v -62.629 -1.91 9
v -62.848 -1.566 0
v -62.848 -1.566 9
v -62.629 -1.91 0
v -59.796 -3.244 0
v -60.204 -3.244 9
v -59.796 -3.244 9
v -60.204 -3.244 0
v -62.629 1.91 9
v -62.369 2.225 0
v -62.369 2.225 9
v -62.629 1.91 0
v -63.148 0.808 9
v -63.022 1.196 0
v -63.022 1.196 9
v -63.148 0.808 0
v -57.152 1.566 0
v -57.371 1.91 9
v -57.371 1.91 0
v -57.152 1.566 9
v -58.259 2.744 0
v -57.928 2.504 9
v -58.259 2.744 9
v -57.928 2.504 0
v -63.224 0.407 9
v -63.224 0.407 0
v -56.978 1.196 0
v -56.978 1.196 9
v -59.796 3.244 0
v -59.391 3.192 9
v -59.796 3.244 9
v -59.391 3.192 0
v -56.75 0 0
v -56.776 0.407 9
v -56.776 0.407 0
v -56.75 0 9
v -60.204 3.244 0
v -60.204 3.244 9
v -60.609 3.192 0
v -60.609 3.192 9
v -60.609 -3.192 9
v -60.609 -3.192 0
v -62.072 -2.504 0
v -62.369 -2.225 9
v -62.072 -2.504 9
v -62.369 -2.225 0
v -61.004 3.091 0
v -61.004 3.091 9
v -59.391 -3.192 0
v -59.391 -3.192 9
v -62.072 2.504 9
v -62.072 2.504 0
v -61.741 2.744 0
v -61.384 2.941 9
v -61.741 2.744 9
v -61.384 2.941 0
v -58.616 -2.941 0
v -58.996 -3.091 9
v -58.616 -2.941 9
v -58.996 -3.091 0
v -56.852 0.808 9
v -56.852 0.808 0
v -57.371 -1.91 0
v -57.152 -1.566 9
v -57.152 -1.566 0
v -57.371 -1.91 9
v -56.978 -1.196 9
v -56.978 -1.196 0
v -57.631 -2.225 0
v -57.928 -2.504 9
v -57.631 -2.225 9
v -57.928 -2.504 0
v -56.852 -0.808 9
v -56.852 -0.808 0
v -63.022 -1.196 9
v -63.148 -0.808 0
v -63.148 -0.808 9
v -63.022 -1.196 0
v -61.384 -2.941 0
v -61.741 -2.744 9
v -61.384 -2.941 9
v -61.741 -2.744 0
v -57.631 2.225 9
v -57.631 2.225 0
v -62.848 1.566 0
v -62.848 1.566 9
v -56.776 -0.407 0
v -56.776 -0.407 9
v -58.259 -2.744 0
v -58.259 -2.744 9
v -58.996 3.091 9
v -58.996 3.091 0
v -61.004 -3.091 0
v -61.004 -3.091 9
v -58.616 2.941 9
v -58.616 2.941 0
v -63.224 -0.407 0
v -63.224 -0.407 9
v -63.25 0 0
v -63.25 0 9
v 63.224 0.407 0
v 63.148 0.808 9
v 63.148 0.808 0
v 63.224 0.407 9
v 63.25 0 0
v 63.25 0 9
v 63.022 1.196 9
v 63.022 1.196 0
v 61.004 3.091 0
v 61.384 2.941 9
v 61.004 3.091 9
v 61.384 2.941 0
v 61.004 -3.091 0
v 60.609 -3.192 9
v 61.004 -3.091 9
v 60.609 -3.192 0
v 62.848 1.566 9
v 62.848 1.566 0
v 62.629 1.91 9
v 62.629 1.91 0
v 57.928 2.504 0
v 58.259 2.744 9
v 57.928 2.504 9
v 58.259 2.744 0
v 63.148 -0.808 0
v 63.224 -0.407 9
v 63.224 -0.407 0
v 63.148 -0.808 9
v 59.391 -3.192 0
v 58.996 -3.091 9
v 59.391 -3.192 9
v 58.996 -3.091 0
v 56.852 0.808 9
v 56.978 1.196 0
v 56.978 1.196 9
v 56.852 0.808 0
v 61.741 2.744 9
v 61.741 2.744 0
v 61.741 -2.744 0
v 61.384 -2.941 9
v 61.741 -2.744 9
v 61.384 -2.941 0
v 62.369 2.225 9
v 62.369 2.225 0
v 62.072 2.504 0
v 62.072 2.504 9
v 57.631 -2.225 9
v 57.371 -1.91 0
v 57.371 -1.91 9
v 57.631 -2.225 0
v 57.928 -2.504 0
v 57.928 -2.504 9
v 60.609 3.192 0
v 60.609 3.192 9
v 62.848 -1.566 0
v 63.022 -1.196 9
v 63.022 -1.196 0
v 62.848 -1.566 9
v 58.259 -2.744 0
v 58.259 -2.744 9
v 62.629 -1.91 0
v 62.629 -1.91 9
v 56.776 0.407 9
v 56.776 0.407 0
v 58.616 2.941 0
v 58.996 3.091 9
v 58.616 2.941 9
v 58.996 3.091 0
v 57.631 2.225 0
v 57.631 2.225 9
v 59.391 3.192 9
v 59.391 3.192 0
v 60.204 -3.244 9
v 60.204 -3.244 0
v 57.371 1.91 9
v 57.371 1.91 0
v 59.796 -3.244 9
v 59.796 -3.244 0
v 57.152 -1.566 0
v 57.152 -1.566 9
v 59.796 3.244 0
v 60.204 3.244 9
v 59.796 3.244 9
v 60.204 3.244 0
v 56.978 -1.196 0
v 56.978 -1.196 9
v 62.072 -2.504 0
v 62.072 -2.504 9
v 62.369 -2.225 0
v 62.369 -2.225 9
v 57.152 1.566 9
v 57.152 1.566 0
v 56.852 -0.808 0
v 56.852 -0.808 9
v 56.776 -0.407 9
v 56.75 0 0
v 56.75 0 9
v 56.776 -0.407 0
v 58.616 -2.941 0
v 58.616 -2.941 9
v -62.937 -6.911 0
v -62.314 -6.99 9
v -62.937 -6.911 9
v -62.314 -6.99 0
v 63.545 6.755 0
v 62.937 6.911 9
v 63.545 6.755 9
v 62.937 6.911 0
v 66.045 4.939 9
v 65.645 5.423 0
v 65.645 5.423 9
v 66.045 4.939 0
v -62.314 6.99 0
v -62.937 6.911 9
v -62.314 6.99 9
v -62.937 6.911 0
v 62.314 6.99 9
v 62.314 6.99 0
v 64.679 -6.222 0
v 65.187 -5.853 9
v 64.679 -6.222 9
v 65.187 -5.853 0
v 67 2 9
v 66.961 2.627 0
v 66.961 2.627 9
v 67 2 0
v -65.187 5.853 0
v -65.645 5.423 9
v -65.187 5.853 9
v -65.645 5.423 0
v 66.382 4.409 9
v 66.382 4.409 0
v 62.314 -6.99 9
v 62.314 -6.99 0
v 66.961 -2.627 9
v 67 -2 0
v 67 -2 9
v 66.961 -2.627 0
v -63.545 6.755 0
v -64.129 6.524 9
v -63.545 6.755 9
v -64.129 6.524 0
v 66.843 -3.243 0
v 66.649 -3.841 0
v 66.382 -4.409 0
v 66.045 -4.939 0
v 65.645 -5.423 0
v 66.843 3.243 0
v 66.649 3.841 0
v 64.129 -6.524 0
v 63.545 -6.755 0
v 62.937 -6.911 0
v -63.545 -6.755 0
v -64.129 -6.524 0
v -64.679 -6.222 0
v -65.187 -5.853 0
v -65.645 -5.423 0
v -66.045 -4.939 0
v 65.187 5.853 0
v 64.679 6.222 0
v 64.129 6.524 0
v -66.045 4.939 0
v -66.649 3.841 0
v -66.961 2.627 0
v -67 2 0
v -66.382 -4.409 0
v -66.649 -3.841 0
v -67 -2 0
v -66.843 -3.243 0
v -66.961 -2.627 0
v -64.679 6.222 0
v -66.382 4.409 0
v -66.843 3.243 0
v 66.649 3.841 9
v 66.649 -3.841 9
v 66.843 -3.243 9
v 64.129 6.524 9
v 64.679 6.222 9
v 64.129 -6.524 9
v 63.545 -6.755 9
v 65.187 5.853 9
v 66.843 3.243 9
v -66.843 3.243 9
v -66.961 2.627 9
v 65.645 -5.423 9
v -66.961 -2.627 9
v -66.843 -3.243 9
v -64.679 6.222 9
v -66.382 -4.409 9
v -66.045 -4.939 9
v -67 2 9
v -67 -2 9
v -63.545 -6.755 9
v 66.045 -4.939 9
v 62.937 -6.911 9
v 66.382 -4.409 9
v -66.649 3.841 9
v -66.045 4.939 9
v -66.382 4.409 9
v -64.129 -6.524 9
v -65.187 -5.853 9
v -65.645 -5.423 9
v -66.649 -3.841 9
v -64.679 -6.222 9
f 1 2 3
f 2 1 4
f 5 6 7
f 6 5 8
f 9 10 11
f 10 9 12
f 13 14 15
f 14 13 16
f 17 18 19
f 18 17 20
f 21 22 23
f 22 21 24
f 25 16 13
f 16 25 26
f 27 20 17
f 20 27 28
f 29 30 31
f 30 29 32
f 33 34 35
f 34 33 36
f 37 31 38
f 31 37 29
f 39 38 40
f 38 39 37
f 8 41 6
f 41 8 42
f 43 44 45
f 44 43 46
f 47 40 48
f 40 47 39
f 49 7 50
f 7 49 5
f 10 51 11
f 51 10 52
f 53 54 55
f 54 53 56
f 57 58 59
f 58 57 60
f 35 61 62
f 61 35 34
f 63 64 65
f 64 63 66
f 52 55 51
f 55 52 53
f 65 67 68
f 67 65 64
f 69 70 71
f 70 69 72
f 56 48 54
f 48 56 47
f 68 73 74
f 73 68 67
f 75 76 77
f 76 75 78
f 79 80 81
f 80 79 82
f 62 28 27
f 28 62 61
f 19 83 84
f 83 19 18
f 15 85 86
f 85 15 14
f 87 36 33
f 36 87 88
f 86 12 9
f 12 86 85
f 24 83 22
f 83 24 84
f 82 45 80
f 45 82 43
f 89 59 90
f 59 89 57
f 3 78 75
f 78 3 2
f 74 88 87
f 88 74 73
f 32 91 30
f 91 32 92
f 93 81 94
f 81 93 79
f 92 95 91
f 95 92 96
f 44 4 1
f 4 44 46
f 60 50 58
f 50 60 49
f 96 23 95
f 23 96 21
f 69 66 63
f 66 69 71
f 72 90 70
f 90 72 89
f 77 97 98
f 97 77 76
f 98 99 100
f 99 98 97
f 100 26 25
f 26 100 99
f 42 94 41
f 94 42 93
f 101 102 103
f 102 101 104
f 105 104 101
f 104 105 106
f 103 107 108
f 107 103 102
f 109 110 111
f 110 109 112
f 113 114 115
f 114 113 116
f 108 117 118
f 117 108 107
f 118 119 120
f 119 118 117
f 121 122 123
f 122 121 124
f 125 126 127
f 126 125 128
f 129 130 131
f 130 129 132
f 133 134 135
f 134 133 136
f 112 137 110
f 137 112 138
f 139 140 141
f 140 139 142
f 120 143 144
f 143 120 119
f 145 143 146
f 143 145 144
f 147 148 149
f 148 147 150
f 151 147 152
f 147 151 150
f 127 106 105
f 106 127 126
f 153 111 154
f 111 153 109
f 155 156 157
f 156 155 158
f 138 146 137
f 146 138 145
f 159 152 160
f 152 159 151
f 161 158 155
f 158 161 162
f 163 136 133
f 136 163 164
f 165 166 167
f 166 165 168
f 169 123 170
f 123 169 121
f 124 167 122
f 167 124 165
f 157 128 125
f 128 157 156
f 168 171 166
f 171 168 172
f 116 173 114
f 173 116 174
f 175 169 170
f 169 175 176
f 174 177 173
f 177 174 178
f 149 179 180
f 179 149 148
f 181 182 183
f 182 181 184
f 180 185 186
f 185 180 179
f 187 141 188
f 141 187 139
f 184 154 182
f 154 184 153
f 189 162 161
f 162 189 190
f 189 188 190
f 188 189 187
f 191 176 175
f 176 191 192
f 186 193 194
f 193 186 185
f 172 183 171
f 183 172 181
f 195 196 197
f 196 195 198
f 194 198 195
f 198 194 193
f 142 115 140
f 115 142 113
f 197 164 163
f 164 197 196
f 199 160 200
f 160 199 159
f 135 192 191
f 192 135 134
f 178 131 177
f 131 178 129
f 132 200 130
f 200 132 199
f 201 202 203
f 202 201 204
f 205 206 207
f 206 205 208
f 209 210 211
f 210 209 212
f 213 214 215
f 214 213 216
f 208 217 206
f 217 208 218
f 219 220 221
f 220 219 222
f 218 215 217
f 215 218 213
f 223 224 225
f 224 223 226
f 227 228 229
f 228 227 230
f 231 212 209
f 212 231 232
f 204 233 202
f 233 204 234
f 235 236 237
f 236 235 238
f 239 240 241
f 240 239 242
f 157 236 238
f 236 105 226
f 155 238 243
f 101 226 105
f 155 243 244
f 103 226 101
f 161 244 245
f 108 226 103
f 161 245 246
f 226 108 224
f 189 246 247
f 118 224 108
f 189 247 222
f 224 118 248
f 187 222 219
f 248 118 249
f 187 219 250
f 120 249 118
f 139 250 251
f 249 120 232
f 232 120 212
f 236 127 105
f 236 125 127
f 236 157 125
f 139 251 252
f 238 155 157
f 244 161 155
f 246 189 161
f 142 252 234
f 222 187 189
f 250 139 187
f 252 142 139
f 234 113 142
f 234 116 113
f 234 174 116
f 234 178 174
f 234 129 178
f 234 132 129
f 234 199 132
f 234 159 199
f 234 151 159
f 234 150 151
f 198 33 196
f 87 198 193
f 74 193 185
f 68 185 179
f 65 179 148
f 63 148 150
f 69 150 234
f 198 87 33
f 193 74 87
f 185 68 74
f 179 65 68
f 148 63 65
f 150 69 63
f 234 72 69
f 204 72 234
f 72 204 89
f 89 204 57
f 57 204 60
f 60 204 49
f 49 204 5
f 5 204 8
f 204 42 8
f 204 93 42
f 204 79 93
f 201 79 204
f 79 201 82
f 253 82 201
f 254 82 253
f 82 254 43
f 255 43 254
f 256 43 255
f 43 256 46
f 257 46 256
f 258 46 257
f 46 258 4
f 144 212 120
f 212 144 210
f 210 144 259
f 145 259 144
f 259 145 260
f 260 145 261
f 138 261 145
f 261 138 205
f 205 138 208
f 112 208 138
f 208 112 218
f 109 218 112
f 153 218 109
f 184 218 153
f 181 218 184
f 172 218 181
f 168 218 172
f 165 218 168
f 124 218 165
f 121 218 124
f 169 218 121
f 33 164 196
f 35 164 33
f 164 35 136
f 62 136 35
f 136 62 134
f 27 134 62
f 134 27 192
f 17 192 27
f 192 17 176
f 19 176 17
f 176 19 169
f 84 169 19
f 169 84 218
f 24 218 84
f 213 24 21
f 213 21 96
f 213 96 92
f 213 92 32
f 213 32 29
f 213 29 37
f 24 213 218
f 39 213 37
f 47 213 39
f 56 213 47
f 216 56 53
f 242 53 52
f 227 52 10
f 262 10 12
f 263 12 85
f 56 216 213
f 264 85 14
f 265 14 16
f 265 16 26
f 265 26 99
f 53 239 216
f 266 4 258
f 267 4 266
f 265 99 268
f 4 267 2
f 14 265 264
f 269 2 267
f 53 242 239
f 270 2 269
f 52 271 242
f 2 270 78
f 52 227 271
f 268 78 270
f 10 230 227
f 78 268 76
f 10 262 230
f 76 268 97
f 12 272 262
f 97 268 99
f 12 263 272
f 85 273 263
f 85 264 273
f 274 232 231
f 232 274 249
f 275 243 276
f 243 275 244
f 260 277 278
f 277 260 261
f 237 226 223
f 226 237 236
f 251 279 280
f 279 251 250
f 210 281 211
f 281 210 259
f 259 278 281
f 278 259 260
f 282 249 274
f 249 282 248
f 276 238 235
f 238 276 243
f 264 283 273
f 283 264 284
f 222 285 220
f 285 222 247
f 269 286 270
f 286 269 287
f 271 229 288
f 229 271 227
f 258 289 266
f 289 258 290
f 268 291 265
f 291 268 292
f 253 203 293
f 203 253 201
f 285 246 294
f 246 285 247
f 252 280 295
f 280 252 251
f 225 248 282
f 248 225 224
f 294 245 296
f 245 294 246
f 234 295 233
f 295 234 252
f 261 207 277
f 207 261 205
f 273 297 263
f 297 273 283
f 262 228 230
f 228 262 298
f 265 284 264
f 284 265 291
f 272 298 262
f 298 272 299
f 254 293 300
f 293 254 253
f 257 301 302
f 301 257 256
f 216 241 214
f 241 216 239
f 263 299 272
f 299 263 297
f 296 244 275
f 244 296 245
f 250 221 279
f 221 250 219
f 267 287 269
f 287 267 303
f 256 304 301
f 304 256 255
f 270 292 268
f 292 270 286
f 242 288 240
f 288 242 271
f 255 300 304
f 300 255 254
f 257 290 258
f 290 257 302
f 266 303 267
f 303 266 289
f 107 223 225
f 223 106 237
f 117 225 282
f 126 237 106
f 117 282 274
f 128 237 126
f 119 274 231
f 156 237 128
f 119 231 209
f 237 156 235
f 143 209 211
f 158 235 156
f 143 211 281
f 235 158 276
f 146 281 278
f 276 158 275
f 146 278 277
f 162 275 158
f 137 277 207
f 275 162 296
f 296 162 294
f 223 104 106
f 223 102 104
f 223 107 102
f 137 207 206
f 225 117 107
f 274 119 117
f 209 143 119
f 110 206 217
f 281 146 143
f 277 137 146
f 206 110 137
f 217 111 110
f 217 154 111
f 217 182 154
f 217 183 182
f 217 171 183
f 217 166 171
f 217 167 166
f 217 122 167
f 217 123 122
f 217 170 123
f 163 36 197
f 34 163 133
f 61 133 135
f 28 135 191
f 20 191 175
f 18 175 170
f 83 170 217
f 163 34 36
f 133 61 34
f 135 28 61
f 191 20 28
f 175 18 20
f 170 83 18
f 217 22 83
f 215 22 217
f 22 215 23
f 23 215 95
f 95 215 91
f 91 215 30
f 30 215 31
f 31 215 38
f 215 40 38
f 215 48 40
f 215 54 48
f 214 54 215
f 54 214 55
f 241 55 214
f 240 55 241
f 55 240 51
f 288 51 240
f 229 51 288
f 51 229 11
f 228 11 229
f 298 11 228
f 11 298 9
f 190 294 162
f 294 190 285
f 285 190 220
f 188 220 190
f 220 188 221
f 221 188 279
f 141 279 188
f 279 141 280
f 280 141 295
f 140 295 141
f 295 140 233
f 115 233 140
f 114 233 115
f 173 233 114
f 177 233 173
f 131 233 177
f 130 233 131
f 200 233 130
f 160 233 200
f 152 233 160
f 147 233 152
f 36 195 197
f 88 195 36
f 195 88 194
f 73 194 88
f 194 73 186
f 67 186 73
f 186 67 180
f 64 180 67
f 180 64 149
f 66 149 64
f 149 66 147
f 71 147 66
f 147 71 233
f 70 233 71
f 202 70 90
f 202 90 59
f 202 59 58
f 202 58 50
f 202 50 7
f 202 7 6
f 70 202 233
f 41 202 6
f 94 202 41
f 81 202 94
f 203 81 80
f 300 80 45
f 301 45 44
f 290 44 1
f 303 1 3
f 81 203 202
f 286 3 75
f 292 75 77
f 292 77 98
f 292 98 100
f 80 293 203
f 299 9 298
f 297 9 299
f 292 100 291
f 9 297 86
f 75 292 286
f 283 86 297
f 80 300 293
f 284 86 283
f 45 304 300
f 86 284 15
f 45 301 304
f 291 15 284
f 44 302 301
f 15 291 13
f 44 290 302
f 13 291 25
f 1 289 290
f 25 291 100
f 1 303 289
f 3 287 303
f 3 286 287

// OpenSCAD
$fn = 50;


difference() {
	union() {
		hull() {
			translate(v = [-62.0000000000, 2.0000000000, 0]) {
				cylinder(h = 9, r = 5);
			}
			translate(v = [62.0000000000, 2.0000000000, 0]) {
				cylinder(h = 9, r = 5);
			}
			translate(v = [-62.0000000000, -2.0000000000, 0]) {
				cylinder(h = 9, r = 5);
			}
			translate(v = [62.0000000000, -2.0000000000, 0]) {
				cylinder(h = 9, r = 5);
			}
		}
	}
	union() {
		translate(v = [-60.0000000000, 0.0000000000, -100.0000000000]) {
			cylinder(h = 200, r = 3.2500000000);
		}
		translate(v = [-60.0000000000, 0.0000000000, -100.0000000000]) {
			cylinder(h = 200, r = 3.2500000000);
		}
		translate(v = [60.0000000000, 0.0000000000, -100.0000000000]) {
			cylinder(h = 200, r = 3.2500000000);
		}
		translate(v = [60.0000000000, 0.0000000000, -100.0000000000]) {
			cylinder(h = 200, r = 3.2500000000);
		}
	}
}
